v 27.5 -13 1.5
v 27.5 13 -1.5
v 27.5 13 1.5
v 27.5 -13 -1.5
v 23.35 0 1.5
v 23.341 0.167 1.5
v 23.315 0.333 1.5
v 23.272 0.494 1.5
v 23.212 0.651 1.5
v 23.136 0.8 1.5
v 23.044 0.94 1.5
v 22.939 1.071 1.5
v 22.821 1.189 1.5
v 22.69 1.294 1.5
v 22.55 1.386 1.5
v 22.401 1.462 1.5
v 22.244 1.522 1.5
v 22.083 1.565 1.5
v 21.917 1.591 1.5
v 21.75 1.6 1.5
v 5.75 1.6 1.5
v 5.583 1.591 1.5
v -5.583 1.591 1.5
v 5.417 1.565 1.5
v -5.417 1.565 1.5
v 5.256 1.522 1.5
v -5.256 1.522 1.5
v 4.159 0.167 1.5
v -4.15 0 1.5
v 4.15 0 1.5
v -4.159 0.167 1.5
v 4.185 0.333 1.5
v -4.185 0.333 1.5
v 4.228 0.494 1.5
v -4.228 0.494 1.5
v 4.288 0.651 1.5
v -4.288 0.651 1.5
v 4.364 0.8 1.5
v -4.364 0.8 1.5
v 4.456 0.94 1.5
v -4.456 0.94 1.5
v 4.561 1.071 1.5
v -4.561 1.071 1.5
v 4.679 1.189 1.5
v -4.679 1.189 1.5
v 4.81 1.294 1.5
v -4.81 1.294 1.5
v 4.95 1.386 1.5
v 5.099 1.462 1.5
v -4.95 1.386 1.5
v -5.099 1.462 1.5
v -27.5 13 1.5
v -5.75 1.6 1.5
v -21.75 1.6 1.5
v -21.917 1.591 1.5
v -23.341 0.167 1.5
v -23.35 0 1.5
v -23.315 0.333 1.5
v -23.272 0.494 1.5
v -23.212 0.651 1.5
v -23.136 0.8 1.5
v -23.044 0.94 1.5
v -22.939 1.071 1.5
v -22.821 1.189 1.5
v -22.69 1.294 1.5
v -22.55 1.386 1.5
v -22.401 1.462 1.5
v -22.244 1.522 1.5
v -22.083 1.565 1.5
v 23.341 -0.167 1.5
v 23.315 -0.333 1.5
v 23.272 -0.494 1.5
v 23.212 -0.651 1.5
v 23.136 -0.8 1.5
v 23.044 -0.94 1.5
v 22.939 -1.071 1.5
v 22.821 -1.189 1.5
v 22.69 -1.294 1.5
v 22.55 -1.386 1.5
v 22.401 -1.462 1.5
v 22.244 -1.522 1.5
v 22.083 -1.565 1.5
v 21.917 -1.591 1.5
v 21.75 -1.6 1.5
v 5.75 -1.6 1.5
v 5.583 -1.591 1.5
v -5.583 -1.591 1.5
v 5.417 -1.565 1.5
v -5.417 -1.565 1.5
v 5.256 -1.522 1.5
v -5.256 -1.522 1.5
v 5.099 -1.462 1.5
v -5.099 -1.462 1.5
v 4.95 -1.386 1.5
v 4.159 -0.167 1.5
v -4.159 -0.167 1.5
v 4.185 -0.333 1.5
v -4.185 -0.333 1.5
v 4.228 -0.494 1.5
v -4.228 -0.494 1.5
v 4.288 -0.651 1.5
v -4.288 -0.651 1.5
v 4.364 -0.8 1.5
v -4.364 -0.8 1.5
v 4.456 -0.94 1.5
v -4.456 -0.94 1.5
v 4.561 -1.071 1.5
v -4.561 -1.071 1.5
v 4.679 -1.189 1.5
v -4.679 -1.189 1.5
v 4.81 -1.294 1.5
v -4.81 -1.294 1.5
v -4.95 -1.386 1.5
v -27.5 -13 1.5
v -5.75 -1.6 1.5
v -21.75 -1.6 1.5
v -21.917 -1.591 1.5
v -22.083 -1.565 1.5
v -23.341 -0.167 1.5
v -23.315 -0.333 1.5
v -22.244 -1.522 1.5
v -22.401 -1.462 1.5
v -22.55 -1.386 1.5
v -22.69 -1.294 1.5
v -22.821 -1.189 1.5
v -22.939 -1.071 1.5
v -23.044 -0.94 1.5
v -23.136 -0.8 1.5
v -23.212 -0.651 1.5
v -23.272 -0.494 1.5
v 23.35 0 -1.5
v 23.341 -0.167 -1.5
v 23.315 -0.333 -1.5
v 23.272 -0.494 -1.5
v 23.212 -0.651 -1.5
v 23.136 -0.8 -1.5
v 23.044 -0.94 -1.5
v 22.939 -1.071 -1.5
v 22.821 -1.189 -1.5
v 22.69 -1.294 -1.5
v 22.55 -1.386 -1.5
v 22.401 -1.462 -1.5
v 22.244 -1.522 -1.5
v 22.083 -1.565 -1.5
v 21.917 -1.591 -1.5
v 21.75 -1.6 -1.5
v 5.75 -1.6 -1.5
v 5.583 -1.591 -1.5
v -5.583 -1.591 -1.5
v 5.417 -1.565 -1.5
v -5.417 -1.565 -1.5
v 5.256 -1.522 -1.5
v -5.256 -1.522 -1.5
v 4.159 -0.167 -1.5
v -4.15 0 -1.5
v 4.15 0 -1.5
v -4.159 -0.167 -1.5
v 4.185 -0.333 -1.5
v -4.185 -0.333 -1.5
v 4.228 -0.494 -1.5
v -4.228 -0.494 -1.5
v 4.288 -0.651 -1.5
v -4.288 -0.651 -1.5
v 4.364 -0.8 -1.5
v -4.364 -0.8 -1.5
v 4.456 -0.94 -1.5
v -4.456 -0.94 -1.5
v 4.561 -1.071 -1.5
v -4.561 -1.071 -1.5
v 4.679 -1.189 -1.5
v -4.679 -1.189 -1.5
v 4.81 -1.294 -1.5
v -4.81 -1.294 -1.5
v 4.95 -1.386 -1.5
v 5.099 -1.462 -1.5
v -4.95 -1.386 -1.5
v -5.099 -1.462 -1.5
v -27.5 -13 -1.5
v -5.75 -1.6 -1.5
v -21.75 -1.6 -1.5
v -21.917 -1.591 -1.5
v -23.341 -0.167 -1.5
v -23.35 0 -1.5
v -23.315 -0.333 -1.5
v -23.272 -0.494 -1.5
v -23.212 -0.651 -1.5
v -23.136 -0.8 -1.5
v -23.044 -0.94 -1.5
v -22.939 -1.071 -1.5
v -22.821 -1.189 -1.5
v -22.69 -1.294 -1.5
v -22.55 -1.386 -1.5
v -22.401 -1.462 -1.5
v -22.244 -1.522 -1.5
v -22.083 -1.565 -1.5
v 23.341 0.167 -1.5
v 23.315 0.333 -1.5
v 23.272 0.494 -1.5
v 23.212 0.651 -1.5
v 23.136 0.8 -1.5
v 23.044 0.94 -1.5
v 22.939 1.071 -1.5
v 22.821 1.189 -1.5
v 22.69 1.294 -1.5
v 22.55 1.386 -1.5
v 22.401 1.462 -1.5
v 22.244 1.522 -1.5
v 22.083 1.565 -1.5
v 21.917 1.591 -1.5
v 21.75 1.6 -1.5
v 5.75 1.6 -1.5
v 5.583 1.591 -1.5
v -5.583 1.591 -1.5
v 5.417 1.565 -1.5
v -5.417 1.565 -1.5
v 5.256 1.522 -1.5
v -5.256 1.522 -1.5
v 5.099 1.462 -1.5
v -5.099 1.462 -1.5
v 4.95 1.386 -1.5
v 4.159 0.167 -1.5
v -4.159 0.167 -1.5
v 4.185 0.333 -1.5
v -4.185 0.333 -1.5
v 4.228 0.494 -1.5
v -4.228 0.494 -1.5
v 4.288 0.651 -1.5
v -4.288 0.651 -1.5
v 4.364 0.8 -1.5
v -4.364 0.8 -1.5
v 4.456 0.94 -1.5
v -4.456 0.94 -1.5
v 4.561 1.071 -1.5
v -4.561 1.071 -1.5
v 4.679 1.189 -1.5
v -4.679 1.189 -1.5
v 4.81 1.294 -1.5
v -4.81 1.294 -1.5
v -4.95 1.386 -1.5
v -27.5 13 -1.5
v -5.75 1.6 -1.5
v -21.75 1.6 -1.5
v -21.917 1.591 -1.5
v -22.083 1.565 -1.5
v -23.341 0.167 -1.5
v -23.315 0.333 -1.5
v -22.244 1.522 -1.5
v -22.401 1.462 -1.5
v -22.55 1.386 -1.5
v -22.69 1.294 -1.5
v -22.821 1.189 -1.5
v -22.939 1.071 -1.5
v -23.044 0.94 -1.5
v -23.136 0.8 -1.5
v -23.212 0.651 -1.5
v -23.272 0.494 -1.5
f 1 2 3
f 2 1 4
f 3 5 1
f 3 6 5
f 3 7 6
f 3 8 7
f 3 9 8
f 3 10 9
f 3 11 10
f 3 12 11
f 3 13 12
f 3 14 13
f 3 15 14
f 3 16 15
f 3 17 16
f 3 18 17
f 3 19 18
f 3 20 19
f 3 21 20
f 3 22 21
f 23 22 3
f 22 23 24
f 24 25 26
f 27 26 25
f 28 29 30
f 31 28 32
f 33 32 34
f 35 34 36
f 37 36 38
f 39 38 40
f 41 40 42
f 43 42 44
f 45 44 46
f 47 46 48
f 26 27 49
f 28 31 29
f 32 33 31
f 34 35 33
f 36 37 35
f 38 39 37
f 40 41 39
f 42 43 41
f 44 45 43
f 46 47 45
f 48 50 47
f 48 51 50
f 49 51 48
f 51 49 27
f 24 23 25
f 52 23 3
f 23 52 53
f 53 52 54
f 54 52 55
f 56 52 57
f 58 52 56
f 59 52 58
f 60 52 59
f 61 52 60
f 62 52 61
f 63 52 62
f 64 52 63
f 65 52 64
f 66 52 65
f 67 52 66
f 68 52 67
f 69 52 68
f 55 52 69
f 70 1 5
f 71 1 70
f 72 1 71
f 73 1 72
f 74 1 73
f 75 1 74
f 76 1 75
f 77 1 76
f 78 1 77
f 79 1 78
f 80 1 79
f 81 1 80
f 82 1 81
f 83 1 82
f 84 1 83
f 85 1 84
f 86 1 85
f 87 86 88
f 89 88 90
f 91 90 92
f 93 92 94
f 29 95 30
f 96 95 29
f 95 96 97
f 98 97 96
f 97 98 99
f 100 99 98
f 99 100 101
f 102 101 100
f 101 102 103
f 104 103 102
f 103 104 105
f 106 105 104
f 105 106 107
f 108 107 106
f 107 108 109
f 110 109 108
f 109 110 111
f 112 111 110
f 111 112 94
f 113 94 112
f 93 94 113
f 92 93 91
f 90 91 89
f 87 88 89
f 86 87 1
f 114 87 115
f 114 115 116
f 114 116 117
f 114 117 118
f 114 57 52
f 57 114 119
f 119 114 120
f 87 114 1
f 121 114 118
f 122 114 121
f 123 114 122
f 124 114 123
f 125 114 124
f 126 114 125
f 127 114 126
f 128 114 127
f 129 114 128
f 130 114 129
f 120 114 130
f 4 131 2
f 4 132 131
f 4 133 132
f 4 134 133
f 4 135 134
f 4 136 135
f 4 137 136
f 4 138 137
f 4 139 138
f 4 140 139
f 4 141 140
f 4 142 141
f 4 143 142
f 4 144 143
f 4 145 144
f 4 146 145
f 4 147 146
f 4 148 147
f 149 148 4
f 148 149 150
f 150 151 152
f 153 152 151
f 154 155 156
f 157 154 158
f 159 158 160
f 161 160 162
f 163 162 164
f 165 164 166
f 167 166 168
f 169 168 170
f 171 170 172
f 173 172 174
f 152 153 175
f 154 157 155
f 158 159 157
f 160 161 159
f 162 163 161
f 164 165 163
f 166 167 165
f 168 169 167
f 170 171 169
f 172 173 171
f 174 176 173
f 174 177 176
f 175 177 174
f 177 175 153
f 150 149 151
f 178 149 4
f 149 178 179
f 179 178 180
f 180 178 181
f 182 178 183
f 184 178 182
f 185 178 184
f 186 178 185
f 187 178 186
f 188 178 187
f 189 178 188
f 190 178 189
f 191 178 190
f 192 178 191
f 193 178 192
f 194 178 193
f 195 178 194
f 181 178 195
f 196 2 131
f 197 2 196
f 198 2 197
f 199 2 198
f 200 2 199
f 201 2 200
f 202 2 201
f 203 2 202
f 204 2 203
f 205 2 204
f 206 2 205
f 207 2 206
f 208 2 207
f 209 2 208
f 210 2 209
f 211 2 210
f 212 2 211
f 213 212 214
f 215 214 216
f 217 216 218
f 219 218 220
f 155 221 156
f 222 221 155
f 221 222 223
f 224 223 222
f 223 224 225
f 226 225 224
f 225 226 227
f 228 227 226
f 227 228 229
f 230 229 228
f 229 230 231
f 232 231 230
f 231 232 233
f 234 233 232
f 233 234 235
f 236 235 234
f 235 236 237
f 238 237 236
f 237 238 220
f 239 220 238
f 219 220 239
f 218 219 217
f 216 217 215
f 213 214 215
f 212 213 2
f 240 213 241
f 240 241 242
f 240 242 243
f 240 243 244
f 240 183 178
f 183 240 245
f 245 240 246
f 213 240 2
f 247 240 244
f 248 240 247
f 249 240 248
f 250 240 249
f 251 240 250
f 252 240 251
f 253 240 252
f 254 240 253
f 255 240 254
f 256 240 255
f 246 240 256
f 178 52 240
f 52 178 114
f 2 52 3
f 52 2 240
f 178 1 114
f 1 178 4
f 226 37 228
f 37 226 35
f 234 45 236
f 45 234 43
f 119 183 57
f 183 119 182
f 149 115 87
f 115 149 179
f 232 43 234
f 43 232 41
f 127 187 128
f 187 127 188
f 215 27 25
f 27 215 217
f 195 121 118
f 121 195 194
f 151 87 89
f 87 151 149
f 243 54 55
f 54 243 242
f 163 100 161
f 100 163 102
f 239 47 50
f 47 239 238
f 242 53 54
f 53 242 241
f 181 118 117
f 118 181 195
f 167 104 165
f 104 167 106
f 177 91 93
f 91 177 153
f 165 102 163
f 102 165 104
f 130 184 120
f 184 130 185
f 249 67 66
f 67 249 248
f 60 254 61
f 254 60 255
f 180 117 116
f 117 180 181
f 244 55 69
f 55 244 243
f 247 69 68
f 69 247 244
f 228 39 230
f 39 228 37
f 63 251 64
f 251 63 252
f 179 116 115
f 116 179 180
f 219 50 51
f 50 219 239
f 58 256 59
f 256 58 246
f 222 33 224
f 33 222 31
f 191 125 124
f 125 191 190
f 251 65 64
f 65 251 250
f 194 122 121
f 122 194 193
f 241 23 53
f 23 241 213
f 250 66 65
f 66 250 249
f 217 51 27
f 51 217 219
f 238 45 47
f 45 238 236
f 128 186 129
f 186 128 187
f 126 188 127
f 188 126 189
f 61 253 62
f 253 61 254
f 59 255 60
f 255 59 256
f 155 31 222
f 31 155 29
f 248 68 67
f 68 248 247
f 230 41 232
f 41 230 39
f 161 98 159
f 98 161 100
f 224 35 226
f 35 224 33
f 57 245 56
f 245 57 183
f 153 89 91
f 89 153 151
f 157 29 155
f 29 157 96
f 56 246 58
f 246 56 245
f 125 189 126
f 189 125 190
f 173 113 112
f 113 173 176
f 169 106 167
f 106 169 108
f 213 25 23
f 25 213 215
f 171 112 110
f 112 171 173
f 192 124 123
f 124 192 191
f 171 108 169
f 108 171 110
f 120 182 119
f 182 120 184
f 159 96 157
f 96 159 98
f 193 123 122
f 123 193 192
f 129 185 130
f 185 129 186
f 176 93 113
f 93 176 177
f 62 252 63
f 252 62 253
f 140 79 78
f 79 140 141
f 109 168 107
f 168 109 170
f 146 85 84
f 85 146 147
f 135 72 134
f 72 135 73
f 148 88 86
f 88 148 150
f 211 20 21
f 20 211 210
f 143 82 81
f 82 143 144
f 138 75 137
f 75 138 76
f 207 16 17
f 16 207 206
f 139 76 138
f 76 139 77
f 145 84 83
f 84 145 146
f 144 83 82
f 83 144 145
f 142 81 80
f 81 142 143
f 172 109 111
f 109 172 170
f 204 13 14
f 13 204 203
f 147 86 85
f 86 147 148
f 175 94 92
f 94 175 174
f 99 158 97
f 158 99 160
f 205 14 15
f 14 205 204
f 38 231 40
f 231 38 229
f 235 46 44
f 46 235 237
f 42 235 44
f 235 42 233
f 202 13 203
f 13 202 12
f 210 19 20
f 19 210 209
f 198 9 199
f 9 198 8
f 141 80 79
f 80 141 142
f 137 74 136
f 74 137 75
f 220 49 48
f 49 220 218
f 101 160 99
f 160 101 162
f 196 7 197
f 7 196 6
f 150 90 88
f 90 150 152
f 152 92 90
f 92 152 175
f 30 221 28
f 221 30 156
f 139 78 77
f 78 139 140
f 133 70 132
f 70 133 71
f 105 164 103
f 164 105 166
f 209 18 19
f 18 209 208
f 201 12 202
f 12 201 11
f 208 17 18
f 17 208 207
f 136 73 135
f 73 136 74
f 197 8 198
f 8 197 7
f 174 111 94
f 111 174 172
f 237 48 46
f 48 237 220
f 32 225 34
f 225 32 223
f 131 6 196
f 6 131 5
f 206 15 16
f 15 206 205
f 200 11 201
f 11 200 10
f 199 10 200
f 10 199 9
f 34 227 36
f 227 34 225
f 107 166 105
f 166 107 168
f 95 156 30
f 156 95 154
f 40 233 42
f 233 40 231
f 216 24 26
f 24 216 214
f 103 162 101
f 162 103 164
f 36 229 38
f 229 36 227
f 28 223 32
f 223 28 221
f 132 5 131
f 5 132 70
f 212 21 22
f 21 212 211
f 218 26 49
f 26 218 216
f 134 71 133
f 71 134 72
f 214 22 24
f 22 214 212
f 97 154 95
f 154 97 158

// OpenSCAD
// Limit-switch mounting plate.
$fn = 60;
eps = 0.02;
plate_l = 55;
plate_w = 26;
plate_t = 3;
slot_l = 16;
module slot(x) { hull() { translate([x-slot_l/2,0,-plate_t/2-eps]) cylinder(d=3.2,h=plate_t+2*eps); translate([x+slot_l/2,0,-plate_t/2-eps]) cylinder(d=3.2,h=plate_t+2*eps); } }
difference() { cube([plate_l,plate_w,plate_t],center=true); slot(-plate_l/4); slot(plate_l/4); }
